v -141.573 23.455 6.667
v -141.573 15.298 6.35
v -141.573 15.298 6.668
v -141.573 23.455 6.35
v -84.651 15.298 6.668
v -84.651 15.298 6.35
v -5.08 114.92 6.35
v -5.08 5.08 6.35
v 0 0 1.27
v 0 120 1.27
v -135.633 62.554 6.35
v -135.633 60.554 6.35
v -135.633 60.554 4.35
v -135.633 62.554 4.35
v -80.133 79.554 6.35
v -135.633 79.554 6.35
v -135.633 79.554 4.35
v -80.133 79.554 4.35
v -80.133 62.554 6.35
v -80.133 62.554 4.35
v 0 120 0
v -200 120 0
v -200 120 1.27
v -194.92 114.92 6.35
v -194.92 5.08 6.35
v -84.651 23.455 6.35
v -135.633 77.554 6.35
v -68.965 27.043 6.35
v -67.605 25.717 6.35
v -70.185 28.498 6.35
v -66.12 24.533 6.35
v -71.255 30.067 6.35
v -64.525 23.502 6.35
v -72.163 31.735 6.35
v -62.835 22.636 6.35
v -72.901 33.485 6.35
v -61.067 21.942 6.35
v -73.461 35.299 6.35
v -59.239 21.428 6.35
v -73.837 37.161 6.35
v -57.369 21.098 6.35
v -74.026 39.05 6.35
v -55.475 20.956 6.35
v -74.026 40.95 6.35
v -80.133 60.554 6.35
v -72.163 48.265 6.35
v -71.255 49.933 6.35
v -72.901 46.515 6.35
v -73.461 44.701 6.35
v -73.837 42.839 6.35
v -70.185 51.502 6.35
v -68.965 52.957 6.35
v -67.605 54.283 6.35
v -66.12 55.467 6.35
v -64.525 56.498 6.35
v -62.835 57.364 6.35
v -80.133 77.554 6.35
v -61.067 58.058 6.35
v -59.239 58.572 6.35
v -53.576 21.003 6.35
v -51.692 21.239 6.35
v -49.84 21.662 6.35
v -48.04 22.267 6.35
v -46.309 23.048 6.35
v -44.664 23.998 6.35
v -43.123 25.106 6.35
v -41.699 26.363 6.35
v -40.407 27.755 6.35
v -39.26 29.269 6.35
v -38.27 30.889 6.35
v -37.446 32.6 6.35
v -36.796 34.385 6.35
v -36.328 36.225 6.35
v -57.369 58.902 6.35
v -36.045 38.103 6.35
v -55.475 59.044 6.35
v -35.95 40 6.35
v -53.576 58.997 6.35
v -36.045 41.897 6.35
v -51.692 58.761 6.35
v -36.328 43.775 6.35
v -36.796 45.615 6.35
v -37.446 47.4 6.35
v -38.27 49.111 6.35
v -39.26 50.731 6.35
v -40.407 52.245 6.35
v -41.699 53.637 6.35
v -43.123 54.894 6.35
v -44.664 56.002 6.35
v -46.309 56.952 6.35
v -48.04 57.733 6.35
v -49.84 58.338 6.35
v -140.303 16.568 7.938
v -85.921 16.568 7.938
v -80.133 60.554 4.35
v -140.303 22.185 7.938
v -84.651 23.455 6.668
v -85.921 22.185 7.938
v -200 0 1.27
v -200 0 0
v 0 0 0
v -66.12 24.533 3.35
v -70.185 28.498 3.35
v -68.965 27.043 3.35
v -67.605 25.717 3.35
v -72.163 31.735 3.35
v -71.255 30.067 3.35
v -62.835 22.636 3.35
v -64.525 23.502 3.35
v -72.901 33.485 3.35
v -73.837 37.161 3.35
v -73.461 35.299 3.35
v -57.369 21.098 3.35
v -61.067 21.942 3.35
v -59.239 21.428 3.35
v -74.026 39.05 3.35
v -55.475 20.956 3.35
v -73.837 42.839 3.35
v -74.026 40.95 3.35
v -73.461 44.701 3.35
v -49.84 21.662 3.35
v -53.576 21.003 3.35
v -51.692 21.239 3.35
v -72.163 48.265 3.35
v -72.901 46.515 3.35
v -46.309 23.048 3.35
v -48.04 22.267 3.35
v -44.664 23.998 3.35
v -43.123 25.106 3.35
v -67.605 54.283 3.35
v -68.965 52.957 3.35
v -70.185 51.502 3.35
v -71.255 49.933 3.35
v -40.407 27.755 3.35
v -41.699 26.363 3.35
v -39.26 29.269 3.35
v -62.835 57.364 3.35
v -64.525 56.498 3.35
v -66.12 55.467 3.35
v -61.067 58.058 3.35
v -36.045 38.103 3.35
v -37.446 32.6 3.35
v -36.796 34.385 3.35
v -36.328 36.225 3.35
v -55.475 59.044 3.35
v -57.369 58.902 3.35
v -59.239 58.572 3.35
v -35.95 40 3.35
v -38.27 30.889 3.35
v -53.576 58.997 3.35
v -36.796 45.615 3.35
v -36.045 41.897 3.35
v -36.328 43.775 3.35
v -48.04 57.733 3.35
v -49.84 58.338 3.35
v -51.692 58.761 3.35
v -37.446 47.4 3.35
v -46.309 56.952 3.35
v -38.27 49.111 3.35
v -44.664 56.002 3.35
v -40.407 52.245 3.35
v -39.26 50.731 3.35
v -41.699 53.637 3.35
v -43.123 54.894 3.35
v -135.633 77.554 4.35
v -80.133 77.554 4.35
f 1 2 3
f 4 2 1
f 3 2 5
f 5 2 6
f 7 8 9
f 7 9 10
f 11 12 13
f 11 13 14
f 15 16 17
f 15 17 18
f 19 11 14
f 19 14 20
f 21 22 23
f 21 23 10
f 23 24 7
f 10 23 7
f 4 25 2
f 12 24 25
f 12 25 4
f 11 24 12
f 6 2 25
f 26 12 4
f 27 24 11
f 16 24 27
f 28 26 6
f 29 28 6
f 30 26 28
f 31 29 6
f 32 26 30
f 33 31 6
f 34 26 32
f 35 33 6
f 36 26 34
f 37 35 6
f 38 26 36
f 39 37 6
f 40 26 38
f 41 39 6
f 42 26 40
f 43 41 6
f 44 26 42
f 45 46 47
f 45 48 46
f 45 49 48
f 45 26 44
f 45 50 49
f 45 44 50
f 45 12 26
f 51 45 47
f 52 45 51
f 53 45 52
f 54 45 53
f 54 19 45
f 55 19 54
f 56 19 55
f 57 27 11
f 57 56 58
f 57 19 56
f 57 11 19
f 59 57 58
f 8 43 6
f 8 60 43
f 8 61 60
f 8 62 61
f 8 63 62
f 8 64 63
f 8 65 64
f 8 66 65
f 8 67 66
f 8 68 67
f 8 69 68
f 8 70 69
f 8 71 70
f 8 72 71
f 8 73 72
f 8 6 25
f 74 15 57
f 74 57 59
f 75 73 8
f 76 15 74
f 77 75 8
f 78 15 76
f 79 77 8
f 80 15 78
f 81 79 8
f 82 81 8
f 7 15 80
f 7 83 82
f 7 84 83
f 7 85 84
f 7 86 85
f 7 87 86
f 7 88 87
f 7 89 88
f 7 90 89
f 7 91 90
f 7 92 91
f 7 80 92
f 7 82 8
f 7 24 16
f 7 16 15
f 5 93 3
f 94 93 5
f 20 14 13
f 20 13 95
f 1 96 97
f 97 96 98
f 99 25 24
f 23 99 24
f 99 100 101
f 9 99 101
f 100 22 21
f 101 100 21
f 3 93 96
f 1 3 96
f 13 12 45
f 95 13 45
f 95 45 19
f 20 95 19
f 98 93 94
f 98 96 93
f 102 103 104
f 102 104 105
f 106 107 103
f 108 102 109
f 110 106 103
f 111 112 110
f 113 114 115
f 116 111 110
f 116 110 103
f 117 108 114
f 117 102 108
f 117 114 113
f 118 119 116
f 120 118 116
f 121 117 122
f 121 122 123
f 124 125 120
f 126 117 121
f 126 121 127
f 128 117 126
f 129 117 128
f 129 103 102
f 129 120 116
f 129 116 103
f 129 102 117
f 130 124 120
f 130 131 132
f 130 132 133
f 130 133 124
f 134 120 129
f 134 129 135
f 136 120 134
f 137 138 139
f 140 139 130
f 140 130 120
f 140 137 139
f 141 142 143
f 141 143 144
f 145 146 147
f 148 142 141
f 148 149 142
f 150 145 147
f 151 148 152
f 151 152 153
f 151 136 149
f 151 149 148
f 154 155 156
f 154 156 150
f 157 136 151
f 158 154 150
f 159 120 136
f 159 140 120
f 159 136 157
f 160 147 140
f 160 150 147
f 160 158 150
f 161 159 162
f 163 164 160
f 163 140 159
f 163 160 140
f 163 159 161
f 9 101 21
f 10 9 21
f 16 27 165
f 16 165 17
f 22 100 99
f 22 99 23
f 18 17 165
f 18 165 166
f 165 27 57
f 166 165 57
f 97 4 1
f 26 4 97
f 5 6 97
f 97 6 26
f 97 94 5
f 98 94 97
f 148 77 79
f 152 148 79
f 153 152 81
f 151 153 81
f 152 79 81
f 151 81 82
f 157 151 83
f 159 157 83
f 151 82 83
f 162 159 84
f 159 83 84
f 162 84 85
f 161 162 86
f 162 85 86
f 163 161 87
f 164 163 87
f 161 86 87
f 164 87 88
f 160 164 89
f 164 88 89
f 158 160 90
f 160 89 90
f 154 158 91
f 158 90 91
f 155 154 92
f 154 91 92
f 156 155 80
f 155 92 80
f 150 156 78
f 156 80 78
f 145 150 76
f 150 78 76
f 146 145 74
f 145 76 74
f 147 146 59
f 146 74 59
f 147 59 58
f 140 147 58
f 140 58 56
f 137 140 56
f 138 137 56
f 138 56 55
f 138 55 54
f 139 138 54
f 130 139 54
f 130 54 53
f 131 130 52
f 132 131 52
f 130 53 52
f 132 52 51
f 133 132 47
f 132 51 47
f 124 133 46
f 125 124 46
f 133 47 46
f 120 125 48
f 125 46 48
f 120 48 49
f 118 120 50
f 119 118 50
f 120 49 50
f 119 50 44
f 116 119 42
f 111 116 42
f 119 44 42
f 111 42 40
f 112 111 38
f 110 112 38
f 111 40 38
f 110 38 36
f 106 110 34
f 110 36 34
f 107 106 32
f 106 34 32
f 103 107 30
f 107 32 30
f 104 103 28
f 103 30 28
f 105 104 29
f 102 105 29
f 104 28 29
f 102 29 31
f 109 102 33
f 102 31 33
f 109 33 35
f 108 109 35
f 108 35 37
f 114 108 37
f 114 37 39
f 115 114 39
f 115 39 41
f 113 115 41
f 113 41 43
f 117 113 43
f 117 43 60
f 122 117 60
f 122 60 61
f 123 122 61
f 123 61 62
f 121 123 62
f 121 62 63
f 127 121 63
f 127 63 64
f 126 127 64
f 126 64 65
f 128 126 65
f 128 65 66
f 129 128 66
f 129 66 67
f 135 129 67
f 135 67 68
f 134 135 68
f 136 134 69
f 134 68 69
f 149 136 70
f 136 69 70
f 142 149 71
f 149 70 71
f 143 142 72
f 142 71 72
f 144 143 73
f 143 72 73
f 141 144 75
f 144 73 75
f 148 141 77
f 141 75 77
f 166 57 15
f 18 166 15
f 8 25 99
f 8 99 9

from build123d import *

# Parameters (mm, degrees)
F0_W     = 200
F0_H     = 120
F1_DEPTH = 6.35
F3_SIZE  = 5.08
F4_W     = 56.922462
F4_H     = 8.15711
F5_DEPTH = 1.5875
F6_SIZE  = 1.27
F2_R     = 19.05
F7_DEPTH = 3
F8_W     = 55.5
F8_H     = 2
F9_DEPTH = 2


with BuildPart() as f1:
    # F0 (on Top) → F1 (new body)
    with BuildSketch(Plane.XY):
        with Locations((-100, 60)):
            Rectangle(F0_W, F0_H)
    extrude(amount=F1_DEPTH)

    # F3
    f3_edges = [f1.edges().sort_by_distance(p)[0] for p in [
        (-200, 60, 6.35),
        (-100, 120, 6.35),
        (-100, 0, 6.35),
        (0, 60, 6.35),
    ]]
    chamfer(f3_edges, length=F3_SIZE)

    # F4 (on face) → F5 (join)
    with BuildSketch(Plane.XY.offset(6.35)):
        with Locations((-113.111961, 19.376122)):
            Rectangle(F4_W, F4_H)
    extrude(amount=F5_DEPTH)

    # F6
    f6_edges = [f1.edges().sort_by_distance(p)[0] for p in [
        (-113.111961, 15.297567, 7.9375),
        (-141.573192, 19.376122, 7.9375),
        (-113.111961, 23.454677, 7.9375),
        (-84.65073, 19.376122, 7.9375),
    ]]
    chamfer(f6_edges, length=F6_SIZE)

    # F2 (on face) → F7 (cut)
    with BuildSketch(Plane.XY.offset(6.35)):
        with Locations((-55, 40)):
            Circle(F2_R)
    extrude(amount=-F7_DEPTH, mode=Mode.SUBTRACT)

    # F8 (on face) → F9 (cut)
    with BuildSketch(Plane.XY.offset(6.35)):
        with Locations((-107.8826, 78.554325)):
            Rectangle(F8_W, F8_H)
        with Locations((-107.8826, 61.554325)):
            Rectangle(F8_W, F8_H)
    extrude(amount=-F9_DEPTH, mode=Mode.SUBTRACT)


solid = f1.part
